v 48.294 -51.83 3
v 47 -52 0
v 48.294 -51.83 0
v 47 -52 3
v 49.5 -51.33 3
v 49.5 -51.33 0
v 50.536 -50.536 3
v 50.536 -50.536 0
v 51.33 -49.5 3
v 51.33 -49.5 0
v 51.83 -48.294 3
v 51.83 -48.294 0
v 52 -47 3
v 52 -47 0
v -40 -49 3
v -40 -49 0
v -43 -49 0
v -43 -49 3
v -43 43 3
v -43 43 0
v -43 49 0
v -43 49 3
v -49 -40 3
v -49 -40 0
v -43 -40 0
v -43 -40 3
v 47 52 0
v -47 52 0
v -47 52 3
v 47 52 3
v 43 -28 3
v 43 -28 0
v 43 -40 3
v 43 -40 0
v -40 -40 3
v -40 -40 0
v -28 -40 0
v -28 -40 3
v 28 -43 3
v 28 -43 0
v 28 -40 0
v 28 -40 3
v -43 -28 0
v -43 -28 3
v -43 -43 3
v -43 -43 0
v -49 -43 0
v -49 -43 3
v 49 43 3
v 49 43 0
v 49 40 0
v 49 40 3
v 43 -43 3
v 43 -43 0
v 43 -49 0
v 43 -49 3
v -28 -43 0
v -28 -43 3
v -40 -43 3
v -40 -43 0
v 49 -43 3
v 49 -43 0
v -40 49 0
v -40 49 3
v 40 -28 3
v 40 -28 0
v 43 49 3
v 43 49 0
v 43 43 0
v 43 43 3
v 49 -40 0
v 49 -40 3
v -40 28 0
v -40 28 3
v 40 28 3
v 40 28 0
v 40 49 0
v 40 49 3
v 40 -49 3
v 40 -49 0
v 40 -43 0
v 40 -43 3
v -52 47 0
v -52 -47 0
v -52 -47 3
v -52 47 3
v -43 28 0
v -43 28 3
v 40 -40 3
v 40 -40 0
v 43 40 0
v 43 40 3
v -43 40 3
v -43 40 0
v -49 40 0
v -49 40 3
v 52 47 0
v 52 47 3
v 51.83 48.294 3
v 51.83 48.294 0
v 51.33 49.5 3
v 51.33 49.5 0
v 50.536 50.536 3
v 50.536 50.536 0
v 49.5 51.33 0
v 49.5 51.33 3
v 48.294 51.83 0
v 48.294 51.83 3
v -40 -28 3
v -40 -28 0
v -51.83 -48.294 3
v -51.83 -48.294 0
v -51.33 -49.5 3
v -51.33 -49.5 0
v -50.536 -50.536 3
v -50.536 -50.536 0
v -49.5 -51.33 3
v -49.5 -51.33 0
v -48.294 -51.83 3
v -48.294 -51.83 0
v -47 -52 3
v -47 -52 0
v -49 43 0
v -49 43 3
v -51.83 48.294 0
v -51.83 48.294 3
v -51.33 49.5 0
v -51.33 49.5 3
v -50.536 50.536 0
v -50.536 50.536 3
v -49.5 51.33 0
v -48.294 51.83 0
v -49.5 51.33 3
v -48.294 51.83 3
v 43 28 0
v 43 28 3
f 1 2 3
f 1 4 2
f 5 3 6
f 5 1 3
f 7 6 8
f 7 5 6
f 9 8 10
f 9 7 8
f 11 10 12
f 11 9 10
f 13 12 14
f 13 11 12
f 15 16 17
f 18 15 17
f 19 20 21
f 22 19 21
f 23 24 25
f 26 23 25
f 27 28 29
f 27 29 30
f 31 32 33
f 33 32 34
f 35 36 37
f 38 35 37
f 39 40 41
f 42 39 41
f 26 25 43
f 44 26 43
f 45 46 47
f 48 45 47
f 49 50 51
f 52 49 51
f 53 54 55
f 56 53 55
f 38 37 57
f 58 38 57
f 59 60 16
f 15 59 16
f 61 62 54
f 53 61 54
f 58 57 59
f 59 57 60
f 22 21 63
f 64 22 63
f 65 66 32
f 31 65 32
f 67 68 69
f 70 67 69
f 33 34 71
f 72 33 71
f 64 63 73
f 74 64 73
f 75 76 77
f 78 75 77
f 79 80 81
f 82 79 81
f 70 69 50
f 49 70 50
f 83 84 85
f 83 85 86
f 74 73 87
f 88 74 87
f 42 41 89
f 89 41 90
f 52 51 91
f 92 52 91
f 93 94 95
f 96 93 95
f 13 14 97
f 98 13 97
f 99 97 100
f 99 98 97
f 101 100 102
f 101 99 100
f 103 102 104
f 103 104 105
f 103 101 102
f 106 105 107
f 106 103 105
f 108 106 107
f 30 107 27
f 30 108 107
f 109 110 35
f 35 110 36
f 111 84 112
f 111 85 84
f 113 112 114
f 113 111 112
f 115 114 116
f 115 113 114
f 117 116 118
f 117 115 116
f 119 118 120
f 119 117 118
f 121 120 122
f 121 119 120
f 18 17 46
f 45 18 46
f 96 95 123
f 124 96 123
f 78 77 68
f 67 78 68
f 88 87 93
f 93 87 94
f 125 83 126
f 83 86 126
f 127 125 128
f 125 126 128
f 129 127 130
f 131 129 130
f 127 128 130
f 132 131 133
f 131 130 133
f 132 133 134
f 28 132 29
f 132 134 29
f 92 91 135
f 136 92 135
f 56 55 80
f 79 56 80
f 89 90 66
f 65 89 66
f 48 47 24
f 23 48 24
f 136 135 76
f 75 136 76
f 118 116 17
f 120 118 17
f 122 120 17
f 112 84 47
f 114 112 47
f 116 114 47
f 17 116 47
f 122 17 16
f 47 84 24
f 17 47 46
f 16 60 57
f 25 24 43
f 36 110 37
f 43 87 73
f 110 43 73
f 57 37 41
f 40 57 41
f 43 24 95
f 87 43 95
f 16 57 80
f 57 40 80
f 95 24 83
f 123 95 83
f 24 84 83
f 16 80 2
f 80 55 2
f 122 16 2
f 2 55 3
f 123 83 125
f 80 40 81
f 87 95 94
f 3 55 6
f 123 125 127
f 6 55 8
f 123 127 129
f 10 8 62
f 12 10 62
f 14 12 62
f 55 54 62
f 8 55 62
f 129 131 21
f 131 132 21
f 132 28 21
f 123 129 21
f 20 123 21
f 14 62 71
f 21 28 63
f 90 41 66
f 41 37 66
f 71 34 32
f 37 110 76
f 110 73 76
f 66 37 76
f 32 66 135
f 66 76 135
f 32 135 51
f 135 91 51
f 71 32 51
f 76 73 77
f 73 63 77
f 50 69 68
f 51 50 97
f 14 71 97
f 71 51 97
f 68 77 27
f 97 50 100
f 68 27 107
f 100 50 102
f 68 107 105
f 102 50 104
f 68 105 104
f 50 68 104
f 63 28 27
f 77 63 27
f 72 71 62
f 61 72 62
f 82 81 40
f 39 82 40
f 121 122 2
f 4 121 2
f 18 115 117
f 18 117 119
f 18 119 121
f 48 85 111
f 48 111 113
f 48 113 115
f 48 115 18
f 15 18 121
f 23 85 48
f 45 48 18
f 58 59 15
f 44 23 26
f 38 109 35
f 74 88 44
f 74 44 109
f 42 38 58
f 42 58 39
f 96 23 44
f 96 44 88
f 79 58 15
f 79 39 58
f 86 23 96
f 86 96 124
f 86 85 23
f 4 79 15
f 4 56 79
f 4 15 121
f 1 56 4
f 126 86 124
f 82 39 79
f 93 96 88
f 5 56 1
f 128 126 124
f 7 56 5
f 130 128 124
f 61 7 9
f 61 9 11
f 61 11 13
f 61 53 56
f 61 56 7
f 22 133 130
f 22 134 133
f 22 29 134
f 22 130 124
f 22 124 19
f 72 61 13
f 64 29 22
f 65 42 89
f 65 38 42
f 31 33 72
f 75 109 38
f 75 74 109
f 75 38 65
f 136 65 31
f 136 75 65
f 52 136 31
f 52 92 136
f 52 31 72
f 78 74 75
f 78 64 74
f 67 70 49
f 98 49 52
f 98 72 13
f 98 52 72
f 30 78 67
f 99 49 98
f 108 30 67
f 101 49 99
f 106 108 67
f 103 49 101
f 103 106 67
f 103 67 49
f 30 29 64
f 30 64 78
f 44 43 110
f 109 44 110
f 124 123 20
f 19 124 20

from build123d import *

# Parameters (mm, degrees)
F1_W     = 104
F1_H     = 104
F2_DEPTH = 3
F3_R     = 5


with BuildPart() as f2:
    # F1 (on Top) → F2 (new body)
    with BuildSketch(Plane.XY):
        Rectangle(F1_W, F1_H)
        Polygon((28, -43), (28, -40), (-28, -40), (-28, -43), (-40, -43), (-40, -49), (-43, -49), (-43, -43), (-49, -43), (-49, -40), (-43, -40), (-43, -28), (-40, -28), (-40, 28), (-43, 28), (-43, 40), (-49, 40), (-49, 43), (-43, 43), (-43, 49), (-40, 49), (-40, 43), (-40, 40), (40, 40), (40, 43), (40, 49), (43, 49), (43, 43), (49, 43), (49, 40), (43, 40), (43, 28), (40, 28), (40, -28), (43, -28), (43, -40), (49, -40), (49, -43), (43, -43), (43, -49), (40, -49), (40, -43), align=None, mode=Mode.SUBTRACT)
        Polygon((28, -40), (40, -40), (40, -28), (40, 28), (40, 40), (-40, 40), (-40, 28), (-40, -28), (-40, -40), (-28, -40), align=None)
    extrude(amount=F2_DEPTH)

    # F3
    f3_edges = [f2.edges().sort_by_distance(p)[0] for p in [
        (-52, -52, 1.5),
        (-52, 52, 1.5),
        (52, -52, 1.5),
        (52, 52, 1.5),
    ]]
    fillet(f3_edges, radius=F3_R)


solid = f2.part
